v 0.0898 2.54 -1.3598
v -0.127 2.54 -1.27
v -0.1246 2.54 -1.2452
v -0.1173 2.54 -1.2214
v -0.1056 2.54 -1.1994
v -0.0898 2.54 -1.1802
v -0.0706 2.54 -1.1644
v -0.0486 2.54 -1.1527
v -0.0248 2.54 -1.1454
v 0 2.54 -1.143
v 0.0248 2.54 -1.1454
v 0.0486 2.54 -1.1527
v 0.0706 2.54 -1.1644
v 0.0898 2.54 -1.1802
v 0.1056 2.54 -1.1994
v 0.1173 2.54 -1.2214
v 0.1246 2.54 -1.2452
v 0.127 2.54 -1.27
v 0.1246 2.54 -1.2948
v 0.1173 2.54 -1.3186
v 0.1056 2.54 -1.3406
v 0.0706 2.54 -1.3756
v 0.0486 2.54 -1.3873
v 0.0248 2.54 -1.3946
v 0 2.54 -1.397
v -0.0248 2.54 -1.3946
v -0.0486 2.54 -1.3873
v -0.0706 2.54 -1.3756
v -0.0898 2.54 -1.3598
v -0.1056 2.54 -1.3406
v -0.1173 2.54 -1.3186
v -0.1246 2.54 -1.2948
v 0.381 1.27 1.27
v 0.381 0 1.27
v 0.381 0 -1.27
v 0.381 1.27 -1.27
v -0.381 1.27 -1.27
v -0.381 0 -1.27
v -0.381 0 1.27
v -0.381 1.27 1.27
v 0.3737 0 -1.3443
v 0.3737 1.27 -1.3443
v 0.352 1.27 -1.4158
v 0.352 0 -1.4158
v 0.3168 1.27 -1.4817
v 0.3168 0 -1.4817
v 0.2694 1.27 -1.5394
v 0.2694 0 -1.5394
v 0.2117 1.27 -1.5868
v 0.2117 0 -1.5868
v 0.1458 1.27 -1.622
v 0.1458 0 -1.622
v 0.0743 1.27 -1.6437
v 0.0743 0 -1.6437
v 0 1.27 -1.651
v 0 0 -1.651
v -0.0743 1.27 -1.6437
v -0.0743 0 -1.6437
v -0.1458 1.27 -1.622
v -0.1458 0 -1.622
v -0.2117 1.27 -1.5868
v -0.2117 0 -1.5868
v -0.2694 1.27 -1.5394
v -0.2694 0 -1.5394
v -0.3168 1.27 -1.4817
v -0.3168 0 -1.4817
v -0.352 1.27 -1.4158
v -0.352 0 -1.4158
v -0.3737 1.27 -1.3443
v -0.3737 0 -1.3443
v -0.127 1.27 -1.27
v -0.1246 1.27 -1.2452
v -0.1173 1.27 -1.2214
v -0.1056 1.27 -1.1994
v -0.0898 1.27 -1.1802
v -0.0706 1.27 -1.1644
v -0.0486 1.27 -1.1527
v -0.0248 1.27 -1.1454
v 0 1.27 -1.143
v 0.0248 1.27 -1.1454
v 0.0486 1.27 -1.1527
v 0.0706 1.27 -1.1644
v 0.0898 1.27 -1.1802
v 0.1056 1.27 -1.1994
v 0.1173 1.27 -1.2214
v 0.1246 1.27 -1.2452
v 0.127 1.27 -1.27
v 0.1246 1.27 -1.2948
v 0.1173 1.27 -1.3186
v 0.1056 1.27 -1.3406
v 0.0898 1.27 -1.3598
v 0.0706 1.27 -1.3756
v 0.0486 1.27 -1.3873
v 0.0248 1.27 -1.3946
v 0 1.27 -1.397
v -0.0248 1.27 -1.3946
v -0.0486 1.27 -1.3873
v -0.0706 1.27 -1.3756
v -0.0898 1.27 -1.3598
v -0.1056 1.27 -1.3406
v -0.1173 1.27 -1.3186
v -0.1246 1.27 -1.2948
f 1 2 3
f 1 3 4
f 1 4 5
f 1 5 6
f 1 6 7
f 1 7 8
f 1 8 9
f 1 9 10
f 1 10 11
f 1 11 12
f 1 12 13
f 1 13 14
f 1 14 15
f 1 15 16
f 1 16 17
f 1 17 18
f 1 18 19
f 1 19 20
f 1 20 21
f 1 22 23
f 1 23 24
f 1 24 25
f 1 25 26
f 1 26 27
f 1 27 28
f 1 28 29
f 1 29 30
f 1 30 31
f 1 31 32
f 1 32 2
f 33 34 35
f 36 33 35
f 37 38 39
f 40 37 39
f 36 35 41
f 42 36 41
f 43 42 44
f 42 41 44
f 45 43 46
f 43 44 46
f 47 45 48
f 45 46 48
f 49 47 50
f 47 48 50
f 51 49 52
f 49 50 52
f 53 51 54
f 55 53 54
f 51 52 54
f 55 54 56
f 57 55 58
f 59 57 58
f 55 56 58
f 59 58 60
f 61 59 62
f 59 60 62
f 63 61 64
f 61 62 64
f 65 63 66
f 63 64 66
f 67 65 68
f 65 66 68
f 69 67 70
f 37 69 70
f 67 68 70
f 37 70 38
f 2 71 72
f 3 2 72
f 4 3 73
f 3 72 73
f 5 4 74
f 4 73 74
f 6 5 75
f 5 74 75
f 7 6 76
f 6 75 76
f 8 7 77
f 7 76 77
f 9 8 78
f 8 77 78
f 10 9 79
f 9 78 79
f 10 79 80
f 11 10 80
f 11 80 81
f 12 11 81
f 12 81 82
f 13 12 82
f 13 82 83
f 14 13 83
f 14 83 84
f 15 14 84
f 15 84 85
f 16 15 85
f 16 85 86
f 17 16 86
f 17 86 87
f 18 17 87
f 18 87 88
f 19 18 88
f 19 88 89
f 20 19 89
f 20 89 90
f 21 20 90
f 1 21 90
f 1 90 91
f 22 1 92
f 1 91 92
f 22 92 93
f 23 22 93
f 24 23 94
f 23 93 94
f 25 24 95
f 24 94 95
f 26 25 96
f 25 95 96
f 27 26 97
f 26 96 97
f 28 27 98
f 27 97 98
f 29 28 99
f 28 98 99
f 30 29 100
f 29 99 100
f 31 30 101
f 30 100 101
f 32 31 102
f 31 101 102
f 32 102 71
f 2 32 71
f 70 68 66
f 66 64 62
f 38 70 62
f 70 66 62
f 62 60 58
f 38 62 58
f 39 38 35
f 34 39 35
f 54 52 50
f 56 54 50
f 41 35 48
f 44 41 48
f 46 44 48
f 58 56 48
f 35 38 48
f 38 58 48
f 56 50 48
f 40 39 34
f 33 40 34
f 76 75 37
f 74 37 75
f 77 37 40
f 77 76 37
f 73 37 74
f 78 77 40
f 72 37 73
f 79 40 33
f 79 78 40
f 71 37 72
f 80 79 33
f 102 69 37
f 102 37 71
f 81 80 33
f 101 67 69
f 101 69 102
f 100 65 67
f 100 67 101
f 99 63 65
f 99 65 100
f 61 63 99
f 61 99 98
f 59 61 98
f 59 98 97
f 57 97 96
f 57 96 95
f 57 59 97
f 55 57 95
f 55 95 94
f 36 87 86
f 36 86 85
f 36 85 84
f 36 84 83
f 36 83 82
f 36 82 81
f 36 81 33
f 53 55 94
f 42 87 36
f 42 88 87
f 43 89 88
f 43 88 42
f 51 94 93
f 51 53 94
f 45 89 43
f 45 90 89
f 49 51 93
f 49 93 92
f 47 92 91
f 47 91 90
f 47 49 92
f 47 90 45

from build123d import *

# Parameters (mm, degrees)
BOSS_EXTRUDE1_DEPTH = 1.27
SKETCH1_4_R         = 0.127
BOSS_EXTRUDE2_DEPTH = 2.54


with BuildPart() as part:
    # Sketch1 → Boss-Extrude1 (new body)
    with BuildSketch(Plane(origin=(0, 0, 0), x_dir=(1, 0, 0), z_dir=(0, 1, 0))):
        with BuildLine():
            Line((-0.381, 1.27), (-0.381, -1.27))
            Line((-0.381, -1.27), (0.381, -1.27))
            Line((0.381, -1.27), (0.381, 1.27))
            ThreePointArc((0.381, 1.27), (0, 1.651), (-0.381, 1.27))
        make_face()
    extrude(amount=BOSS_EXTRUDE1_DEPTH)

    # Sketch1<4> → Boss-Extrude2 (add)
    with BuildSketch(Plane(origin=(0, 0, 0), x_dir=(1, 0, 0), z_dir=(0, 1, 0))):
        with Locations((0, 1.27)):
            Circle(SKETCH1_4_R)
    extrude(amount=BOSS_EXTRUDE2_DEPTH)


solid = part.part
